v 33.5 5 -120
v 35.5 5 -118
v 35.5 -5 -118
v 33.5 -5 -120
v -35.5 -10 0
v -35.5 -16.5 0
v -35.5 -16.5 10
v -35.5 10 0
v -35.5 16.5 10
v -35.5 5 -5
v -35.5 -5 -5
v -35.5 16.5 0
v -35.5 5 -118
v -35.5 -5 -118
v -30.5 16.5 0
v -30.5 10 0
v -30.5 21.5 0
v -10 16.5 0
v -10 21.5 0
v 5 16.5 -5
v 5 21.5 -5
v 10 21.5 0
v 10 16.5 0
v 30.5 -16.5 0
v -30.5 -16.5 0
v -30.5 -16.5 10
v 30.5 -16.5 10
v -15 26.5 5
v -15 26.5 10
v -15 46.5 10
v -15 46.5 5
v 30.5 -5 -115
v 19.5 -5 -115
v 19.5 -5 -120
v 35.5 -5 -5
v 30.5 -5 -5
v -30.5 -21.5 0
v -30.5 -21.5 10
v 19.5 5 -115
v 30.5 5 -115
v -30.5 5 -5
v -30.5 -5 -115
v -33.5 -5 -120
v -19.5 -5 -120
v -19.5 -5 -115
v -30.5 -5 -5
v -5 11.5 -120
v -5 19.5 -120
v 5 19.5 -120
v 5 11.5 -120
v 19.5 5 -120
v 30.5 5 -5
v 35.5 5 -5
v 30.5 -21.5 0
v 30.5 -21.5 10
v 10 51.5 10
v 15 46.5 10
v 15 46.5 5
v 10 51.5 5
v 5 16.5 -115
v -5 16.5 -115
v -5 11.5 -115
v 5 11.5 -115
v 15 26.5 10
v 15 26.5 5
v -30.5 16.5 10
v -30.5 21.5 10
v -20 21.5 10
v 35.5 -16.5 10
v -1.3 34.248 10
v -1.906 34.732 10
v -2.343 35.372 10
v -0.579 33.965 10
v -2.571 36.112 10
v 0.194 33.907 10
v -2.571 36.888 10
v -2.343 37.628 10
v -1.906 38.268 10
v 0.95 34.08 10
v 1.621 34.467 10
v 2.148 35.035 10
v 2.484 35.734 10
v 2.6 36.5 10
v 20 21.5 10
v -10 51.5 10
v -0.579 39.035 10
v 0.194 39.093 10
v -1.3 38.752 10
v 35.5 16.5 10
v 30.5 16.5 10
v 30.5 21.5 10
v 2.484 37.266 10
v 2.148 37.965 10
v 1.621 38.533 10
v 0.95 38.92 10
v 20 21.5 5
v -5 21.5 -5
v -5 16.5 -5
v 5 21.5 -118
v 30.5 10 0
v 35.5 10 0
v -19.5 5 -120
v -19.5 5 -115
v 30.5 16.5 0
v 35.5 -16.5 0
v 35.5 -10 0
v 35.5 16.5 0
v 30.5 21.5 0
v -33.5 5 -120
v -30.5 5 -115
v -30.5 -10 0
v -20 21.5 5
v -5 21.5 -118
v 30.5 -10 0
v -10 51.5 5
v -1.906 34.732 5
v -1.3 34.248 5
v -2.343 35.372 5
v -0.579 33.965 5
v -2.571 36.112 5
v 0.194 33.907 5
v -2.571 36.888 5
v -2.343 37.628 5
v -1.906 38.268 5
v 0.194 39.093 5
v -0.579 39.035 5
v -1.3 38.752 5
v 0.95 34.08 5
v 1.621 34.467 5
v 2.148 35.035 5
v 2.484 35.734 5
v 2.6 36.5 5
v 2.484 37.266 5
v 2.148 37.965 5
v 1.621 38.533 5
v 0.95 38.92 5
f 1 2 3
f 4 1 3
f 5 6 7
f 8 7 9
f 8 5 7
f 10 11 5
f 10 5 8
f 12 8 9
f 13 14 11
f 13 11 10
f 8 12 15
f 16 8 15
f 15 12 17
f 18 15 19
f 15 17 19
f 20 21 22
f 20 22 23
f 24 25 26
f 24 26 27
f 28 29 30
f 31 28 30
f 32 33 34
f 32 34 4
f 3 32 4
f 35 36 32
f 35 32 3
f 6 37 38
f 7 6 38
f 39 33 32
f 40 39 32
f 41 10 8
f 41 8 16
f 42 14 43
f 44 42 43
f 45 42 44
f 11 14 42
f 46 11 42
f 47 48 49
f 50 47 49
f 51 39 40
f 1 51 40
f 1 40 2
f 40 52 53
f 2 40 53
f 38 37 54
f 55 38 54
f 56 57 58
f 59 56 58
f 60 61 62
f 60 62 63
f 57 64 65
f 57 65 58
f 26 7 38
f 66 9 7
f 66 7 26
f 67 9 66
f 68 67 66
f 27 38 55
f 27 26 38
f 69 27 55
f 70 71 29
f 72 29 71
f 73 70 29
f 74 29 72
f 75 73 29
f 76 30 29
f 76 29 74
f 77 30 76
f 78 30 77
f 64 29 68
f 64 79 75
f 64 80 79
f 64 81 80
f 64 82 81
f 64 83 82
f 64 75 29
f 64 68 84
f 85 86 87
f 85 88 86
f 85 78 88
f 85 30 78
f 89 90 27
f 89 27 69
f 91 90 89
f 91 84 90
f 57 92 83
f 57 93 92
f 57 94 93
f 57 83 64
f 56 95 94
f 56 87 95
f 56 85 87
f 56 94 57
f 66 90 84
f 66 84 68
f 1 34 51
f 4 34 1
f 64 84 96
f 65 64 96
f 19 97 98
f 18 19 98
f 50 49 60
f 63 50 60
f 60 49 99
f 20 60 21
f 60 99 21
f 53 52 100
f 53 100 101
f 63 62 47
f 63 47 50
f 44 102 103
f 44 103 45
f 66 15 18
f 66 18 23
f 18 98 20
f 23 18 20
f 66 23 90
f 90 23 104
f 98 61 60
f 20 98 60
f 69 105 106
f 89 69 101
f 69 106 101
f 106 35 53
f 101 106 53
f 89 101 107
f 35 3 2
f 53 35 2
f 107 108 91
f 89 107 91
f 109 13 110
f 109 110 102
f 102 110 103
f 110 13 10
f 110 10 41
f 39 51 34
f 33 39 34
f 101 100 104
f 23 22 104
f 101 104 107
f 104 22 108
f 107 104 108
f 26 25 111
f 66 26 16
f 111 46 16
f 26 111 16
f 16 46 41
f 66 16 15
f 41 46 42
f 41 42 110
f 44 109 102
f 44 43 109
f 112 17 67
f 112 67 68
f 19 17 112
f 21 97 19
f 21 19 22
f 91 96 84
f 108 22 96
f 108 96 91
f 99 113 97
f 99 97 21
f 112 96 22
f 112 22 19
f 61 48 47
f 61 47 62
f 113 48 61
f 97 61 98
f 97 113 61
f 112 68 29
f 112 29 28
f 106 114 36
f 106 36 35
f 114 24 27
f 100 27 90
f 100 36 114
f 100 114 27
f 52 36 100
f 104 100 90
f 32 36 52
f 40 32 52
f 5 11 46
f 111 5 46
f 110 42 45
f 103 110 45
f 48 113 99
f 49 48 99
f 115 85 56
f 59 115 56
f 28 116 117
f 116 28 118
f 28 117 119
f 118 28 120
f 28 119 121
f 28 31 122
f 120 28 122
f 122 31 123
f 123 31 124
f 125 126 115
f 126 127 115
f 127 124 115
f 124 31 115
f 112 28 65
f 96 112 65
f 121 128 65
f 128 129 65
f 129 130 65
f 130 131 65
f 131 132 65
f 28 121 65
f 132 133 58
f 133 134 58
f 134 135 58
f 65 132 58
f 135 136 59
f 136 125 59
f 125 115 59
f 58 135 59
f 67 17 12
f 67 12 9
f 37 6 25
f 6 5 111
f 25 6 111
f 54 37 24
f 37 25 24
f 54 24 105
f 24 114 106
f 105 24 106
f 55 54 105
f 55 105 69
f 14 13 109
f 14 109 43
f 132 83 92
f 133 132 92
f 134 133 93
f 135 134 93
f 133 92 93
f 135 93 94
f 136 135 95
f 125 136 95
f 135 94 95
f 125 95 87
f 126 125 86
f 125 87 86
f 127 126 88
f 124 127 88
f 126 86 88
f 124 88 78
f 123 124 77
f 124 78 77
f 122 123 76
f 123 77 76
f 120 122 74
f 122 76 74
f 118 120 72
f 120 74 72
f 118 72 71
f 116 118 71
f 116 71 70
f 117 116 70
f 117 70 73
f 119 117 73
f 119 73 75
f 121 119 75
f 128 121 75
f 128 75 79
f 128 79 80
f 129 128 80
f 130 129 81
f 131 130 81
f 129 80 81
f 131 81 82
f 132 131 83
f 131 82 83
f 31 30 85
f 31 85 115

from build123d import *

# Parameters (mm, degrees)
SKETCH_W        = 71
SKETCH_H        = 43
SKETCH_W_2      = 61
SKETCH_H_2      = 33
PAD_DEPTH       = 10
SKETCH001_W     = 5
SKETCH001_H     = 10
SKETCH001_W_2   = 10
SKETCH001_H_2   = 5
PAD001_DEPTH    = 120
SKETCH002_W     = 10
SKETCH002_H     = 5
PAD002_DEPTH    = 5
SKETCH003_W     = 16
SKETCH003_H     = 10
PAD003_DEPTH    = 5
CHAMFER_SIZE    = 5
SKETCH004_W     = 30
SKETCH004_H     = 30
SKETCH004_R     = 2.6
PAD004_DEPTH    = 5
CHAMFER001_SIZE = 5
CHAMFER002_SIZE = 2


with BuildPart() as part:
    # Sketch → Pad (new body)
    with BuildSketch(Plane.XY):
        Rectangle(SKETCH_W, SKETCH_H)
        Rectangle(SKETCH_W_2, SKETCH_H_2, mode=Mode.SUBTRACT)
    extrude(amount=PAD_DEPTH)

    # Sketch001 (on Face9 of Pad) → Pad001 (join)
    with BuildSketch(Plane(origin=(0, 0, 0), x_dir=(1, 0, 0), z_dir=(0, 0, -1))):
        with Locations((-33, 0)):
            Rectangle(SKETCH001_W, SKETCH001_H)
        with Locations((33, 0)):
            Rectangle(SKETCH001_W, SKETCH001_H)
        with Locations((0, -19)):
            Rectangle(SKETCH001_W_2, SKETCH001_H_2)
    extrude(amount=PAD001_DEPTH)

    # Sketch002 (on Face21 of Pad001) → Pad002 (join)
    with BuildSketch(Plane.XZ.offset(-16.5)):
        with Locations((0, -117.5)):
            Rectangle(SKETCH002_W, SKETCH002_H)
    extrude(amount=PAD002_DEPTH)

    # Sketch003 (on Face7 of Pad002) → Pad003 (join)
    with BuildSketch(Plane(origin=(0, 0, -120), x_dir=(1, 0, 0), z_dir=(0, 0, -1))):
        with Locations((-27.5, 0)):
            Rectangle(SKETCH003_W, SKETCH003_H)
        with Locations((27.5, 0)):
            Rectangle(SKETCH003_W, SKETCH003_H)
    extrude(amount=-PAD003_DEPTH)

    # Chamfer
    chamfer_edges = [part.edges().sort_by_distance(p)[0] for p in [
        (-5, 19, 0),
        (-33, 5, 0),
        (5, 19, 0),
        (33, 5, 0),
        (33, -5, 0),
        (-33, -5, 0),
        (35.5, 21.5, 5),
        (35.5, -21.5, 5),
        (-35.5, 21.5, 5),
        (-35.5, -21.5, 5),
    ]]
    chamfer(chamfer_edges, length=CHAMFER_SIZE)

    # Sketch004 (on Face13 of Chamfer) → Pad004 (join)
    with BuildSketch(Plane.XY.offset(10)):
        with Locations((0, 36.5)):
            Rectangle(SKETCH004_W, SKETCH004_H)
        with Locations((0, 36.5)):
            Circle(SKETCH004_R, mode=Mode.SUBTRACT)
    extrude(amount=-PAD004_DEPTH)

    # Chamfer001
    chamfer001_edges = [part.edges().sort_by_distance(p)[0] for p in [
        (15, 21.5, 7.5),
        (-15, 21.5, 7.5),
        (-15, 51.5, 7.5),
        (15, 51.5, 7.5),
    ]]
    chamfer(chamfer001_edges, length=CHAMFER001_SIZE)

    # Chamfer002
    chamfer002_edges = [part.edges().sort_by_distance(p)[0] for p in [
        (35.5, 0, -120),
        (0, 21.5, -120),
        (-35.5, 0, -120),
    ]]
    chamfer(chamfer002_edges, length=CHAMFER002_SIZE)


solid = part.part
